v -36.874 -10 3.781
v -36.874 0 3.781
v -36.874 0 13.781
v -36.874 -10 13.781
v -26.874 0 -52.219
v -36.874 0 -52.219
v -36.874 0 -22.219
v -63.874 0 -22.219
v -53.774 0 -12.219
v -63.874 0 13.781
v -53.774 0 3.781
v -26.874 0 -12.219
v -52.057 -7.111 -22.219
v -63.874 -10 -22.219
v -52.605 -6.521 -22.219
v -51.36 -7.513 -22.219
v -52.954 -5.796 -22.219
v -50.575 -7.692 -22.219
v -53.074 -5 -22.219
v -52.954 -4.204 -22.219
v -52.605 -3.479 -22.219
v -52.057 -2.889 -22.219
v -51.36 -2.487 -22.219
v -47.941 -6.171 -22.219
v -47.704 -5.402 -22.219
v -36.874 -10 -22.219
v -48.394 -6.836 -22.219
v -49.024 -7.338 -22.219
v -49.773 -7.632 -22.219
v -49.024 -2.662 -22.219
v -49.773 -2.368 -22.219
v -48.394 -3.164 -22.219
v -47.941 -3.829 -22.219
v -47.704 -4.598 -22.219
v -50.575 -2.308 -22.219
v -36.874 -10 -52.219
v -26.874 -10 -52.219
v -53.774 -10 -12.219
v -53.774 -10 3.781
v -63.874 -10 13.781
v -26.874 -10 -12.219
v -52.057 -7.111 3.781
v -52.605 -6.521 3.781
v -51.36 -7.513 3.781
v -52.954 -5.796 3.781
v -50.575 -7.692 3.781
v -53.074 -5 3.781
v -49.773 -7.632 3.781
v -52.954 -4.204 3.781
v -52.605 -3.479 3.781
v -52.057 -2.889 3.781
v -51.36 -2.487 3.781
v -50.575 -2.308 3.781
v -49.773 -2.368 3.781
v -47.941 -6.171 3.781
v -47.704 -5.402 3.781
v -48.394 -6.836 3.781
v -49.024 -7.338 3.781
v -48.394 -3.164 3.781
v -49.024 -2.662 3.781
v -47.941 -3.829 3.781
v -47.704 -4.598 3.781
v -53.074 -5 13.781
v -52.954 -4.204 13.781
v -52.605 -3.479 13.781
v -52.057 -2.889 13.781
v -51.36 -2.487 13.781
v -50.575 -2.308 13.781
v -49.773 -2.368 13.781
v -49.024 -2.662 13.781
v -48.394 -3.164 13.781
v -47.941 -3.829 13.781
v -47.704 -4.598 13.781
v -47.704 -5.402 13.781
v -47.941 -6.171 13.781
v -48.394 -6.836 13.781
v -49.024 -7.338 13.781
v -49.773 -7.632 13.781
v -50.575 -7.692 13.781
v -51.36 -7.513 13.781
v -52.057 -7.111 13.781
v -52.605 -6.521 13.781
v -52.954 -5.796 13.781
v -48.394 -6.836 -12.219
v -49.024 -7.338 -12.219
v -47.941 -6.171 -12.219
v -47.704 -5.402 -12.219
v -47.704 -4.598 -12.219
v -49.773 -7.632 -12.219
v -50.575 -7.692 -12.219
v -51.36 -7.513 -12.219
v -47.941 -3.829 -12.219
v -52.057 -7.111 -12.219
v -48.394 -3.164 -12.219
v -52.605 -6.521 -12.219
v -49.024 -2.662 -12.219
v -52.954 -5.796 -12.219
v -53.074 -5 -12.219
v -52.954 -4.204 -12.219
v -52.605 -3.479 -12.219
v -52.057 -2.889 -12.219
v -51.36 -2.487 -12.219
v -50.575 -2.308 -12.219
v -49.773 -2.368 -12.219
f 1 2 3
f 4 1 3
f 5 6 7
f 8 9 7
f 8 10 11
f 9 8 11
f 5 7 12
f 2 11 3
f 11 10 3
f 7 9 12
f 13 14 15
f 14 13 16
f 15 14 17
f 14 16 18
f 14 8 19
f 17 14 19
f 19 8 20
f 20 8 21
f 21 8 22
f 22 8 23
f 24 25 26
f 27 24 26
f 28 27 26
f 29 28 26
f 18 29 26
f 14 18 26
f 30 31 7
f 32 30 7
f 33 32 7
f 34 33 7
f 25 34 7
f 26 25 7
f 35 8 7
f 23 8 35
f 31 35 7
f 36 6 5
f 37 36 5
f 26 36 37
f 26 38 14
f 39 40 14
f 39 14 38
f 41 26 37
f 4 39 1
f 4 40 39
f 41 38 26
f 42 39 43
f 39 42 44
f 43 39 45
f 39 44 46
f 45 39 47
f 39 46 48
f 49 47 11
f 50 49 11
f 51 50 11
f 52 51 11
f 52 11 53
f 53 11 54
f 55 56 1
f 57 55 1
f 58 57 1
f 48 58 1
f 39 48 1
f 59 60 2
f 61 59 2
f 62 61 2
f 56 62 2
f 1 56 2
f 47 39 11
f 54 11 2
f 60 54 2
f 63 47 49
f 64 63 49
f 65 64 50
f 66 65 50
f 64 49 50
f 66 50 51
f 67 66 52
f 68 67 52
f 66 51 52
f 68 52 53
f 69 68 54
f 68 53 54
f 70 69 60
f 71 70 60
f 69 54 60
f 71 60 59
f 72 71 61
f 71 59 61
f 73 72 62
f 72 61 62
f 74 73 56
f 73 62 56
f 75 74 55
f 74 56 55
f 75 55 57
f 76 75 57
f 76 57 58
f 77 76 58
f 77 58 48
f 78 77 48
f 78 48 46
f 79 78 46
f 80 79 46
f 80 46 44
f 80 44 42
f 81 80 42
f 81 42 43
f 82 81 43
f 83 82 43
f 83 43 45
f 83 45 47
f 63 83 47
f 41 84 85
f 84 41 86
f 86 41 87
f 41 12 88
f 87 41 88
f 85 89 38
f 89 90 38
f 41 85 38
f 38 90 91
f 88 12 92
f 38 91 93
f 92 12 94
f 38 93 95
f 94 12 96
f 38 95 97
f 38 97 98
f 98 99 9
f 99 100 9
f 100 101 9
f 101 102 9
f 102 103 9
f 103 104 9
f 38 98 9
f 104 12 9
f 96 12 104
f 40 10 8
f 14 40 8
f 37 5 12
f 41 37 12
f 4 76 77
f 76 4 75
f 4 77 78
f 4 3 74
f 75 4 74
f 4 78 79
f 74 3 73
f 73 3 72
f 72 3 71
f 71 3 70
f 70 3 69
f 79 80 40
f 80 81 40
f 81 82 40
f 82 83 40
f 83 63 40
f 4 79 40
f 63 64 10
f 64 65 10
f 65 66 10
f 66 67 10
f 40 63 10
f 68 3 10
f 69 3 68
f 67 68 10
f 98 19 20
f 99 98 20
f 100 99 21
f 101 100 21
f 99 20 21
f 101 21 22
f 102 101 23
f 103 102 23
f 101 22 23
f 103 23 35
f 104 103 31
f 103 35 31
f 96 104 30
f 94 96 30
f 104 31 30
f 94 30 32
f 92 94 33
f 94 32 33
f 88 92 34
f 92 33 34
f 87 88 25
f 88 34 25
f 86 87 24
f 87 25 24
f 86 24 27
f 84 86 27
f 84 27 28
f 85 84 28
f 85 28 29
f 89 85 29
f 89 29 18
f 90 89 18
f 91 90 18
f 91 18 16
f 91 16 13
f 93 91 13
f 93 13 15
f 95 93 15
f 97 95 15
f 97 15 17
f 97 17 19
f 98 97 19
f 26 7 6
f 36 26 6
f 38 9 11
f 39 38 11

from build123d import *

# Parameters (mm, degrees)
F2_DEPTH = 10
F4_D     = 5.4


# Not quite as in the source:
# - a feature names something its author has since deleted; it is built from what else it names


with BuildPart() as f2:
    # F1 (on Front) → F2 (new body)
    with BuildSketch(Plane.XZ):
        Polygon((-36.8737237304, 13.780983012), (-63.8737237304, 13.780983012), (-63.8737237304, -22.219016988), (-36.8737237304, -22.219016988), (-36.8737237304, -52.219016988), (-26.8737237304, -52.219016988), (-26.8737237304, -12.219016988), (-36.8737237304, -12.219016988), (-53.7737237304, -12.219016988), (-53.7737237304, 3.780983012), (-36.8737237304, 3.780983012), align=None)
    extrude(amount=F2_DEPTH)

    # F4 (through all)
    with Locations(Plane.XY.offset(13.780983012)):
        with Locations((-50.3737237304, -5)):
            Hole(F4_D / 2)


solid = f2.part
